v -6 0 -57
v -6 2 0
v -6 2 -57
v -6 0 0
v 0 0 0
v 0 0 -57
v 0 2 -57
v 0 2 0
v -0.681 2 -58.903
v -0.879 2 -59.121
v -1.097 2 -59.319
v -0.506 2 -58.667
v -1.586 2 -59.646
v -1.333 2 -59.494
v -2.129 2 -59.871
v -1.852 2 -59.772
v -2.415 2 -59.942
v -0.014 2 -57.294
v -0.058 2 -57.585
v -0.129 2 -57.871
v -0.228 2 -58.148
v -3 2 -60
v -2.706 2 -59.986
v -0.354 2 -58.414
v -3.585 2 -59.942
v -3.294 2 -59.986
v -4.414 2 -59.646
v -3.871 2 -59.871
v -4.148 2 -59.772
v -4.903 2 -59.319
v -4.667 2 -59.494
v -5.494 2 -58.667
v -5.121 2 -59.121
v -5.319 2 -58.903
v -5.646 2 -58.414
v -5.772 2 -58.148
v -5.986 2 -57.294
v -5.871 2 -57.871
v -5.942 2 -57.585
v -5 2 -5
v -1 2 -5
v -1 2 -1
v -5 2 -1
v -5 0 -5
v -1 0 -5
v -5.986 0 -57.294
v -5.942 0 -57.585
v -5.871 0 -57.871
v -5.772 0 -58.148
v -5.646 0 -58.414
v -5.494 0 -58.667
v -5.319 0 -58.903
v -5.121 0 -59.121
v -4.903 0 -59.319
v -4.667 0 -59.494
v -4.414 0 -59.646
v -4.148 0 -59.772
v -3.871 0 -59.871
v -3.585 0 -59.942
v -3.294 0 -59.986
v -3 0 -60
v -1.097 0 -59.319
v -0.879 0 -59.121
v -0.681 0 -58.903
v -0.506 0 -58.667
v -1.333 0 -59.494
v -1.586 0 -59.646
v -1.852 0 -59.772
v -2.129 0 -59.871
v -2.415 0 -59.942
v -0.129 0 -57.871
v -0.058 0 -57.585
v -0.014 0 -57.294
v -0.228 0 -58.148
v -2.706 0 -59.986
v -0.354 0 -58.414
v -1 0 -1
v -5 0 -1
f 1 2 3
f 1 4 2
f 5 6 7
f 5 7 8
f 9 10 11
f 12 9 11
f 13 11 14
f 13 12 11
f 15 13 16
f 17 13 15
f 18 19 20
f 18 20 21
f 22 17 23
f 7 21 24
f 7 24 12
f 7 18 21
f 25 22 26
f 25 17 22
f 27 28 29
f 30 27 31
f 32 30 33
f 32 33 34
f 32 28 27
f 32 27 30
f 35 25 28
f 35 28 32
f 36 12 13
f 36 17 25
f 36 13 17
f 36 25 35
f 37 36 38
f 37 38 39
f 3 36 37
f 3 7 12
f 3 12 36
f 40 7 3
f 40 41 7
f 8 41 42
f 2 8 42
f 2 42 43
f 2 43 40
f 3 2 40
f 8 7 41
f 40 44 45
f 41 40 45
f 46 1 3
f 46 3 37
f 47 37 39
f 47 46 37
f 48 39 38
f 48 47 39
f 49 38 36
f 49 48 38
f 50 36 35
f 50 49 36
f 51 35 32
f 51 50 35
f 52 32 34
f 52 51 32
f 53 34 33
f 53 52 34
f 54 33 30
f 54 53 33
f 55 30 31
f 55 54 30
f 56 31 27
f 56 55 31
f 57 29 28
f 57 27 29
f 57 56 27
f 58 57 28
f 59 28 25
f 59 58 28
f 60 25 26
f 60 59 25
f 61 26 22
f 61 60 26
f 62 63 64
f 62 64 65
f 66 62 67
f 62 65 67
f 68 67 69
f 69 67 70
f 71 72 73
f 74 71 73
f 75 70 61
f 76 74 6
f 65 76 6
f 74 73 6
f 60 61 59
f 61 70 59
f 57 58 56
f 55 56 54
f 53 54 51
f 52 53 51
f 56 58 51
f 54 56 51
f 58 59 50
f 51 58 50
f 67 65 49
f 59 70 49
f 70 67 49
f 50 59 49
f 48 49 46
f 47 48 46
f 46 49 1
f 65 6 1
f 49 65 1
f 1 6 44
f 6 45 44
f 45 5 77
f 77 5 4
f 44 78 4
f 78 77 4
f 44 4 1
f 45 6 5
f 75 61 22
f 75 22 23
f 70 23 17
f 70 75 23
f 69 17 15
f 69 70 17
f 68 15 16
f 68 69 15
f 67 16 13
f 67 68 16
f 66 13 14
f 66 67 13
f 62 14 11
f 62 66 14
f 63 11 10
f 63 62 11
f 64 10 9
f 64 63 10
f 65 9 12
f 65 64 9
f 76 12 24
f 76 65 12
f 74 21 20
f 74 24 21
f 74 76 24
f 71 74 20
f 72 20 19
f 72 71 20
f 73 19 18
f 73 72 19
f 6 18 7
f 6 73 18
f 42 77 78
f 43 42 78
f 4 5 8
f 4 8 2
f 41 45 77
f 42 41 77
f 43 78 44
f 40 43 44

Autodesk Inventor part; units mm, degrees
ref_plane "YZ Plane" through (0, 0, 0) normal (1, 0, 0) x (0, 1, 0)
ref_plane "XZ Plane" through (0, 0, 0) normal (0, 1, 0) x (-1, 0, 0)
ref_plane "XY Plane" through (0, 0, 0) normal (0, 0, 1) x (1, 0, 0)
sketch "Skizze1" plane through (0, 0, 0) normal (0, 1, 0) x (-1, 0, 0)
  line L0 (0, 0) -> (6, 0)
  line L1 (6, 0) -> (6, -57)
  line L2 (3, -60) -> (3, -60)
  line L3 (0, -57) -> (0, 0)
  arc A0 (3, -60) -> (6, -57) centre (3, -57) ccw
  arc A1 (0, -57) -> (3, -60) centre (3, -57) ccw
  line L4 (1, -1) -> (5, -1)
  line L5 (5, -1) -> (5, -5)
  line L6 (5, -5) -> (1, -5)
  line L7 (1, -5) -> (1, -1)
  point P0 (6, -60)
  point P1 (0, -60)
  point P2 (3, -60)
  dimension "d0" = 6
  dimension "d1" = 60
  dimension "d2" = 3
  dimension "d3" = 4
  dimension "d4" = 4
extrude "Extrusion1" add sketch "Skizze1" along normal blind 2
equation "\"Biegeradius\" = Stärke"
equation "\"BreiteBiegungsfreistellung\" = Stärke"
equation "\"TiefeBiegungsfreistellung\" = 0.5 * Stärke"
equation "\"GrößeEckenfreistellung\" = 4 * Stärke"
equation "\"MinimalRest\" = 2 * Stärke"
equation "\"Übergangsradius\" = Biegeradius"
equation "\"JacobiRadiusGröße\" = Biegeradius"
equation "\"Abstandsgröße\" = Stärke"
equation "\"Stärke\" = 0.5"
properties part number "V3_O4"
